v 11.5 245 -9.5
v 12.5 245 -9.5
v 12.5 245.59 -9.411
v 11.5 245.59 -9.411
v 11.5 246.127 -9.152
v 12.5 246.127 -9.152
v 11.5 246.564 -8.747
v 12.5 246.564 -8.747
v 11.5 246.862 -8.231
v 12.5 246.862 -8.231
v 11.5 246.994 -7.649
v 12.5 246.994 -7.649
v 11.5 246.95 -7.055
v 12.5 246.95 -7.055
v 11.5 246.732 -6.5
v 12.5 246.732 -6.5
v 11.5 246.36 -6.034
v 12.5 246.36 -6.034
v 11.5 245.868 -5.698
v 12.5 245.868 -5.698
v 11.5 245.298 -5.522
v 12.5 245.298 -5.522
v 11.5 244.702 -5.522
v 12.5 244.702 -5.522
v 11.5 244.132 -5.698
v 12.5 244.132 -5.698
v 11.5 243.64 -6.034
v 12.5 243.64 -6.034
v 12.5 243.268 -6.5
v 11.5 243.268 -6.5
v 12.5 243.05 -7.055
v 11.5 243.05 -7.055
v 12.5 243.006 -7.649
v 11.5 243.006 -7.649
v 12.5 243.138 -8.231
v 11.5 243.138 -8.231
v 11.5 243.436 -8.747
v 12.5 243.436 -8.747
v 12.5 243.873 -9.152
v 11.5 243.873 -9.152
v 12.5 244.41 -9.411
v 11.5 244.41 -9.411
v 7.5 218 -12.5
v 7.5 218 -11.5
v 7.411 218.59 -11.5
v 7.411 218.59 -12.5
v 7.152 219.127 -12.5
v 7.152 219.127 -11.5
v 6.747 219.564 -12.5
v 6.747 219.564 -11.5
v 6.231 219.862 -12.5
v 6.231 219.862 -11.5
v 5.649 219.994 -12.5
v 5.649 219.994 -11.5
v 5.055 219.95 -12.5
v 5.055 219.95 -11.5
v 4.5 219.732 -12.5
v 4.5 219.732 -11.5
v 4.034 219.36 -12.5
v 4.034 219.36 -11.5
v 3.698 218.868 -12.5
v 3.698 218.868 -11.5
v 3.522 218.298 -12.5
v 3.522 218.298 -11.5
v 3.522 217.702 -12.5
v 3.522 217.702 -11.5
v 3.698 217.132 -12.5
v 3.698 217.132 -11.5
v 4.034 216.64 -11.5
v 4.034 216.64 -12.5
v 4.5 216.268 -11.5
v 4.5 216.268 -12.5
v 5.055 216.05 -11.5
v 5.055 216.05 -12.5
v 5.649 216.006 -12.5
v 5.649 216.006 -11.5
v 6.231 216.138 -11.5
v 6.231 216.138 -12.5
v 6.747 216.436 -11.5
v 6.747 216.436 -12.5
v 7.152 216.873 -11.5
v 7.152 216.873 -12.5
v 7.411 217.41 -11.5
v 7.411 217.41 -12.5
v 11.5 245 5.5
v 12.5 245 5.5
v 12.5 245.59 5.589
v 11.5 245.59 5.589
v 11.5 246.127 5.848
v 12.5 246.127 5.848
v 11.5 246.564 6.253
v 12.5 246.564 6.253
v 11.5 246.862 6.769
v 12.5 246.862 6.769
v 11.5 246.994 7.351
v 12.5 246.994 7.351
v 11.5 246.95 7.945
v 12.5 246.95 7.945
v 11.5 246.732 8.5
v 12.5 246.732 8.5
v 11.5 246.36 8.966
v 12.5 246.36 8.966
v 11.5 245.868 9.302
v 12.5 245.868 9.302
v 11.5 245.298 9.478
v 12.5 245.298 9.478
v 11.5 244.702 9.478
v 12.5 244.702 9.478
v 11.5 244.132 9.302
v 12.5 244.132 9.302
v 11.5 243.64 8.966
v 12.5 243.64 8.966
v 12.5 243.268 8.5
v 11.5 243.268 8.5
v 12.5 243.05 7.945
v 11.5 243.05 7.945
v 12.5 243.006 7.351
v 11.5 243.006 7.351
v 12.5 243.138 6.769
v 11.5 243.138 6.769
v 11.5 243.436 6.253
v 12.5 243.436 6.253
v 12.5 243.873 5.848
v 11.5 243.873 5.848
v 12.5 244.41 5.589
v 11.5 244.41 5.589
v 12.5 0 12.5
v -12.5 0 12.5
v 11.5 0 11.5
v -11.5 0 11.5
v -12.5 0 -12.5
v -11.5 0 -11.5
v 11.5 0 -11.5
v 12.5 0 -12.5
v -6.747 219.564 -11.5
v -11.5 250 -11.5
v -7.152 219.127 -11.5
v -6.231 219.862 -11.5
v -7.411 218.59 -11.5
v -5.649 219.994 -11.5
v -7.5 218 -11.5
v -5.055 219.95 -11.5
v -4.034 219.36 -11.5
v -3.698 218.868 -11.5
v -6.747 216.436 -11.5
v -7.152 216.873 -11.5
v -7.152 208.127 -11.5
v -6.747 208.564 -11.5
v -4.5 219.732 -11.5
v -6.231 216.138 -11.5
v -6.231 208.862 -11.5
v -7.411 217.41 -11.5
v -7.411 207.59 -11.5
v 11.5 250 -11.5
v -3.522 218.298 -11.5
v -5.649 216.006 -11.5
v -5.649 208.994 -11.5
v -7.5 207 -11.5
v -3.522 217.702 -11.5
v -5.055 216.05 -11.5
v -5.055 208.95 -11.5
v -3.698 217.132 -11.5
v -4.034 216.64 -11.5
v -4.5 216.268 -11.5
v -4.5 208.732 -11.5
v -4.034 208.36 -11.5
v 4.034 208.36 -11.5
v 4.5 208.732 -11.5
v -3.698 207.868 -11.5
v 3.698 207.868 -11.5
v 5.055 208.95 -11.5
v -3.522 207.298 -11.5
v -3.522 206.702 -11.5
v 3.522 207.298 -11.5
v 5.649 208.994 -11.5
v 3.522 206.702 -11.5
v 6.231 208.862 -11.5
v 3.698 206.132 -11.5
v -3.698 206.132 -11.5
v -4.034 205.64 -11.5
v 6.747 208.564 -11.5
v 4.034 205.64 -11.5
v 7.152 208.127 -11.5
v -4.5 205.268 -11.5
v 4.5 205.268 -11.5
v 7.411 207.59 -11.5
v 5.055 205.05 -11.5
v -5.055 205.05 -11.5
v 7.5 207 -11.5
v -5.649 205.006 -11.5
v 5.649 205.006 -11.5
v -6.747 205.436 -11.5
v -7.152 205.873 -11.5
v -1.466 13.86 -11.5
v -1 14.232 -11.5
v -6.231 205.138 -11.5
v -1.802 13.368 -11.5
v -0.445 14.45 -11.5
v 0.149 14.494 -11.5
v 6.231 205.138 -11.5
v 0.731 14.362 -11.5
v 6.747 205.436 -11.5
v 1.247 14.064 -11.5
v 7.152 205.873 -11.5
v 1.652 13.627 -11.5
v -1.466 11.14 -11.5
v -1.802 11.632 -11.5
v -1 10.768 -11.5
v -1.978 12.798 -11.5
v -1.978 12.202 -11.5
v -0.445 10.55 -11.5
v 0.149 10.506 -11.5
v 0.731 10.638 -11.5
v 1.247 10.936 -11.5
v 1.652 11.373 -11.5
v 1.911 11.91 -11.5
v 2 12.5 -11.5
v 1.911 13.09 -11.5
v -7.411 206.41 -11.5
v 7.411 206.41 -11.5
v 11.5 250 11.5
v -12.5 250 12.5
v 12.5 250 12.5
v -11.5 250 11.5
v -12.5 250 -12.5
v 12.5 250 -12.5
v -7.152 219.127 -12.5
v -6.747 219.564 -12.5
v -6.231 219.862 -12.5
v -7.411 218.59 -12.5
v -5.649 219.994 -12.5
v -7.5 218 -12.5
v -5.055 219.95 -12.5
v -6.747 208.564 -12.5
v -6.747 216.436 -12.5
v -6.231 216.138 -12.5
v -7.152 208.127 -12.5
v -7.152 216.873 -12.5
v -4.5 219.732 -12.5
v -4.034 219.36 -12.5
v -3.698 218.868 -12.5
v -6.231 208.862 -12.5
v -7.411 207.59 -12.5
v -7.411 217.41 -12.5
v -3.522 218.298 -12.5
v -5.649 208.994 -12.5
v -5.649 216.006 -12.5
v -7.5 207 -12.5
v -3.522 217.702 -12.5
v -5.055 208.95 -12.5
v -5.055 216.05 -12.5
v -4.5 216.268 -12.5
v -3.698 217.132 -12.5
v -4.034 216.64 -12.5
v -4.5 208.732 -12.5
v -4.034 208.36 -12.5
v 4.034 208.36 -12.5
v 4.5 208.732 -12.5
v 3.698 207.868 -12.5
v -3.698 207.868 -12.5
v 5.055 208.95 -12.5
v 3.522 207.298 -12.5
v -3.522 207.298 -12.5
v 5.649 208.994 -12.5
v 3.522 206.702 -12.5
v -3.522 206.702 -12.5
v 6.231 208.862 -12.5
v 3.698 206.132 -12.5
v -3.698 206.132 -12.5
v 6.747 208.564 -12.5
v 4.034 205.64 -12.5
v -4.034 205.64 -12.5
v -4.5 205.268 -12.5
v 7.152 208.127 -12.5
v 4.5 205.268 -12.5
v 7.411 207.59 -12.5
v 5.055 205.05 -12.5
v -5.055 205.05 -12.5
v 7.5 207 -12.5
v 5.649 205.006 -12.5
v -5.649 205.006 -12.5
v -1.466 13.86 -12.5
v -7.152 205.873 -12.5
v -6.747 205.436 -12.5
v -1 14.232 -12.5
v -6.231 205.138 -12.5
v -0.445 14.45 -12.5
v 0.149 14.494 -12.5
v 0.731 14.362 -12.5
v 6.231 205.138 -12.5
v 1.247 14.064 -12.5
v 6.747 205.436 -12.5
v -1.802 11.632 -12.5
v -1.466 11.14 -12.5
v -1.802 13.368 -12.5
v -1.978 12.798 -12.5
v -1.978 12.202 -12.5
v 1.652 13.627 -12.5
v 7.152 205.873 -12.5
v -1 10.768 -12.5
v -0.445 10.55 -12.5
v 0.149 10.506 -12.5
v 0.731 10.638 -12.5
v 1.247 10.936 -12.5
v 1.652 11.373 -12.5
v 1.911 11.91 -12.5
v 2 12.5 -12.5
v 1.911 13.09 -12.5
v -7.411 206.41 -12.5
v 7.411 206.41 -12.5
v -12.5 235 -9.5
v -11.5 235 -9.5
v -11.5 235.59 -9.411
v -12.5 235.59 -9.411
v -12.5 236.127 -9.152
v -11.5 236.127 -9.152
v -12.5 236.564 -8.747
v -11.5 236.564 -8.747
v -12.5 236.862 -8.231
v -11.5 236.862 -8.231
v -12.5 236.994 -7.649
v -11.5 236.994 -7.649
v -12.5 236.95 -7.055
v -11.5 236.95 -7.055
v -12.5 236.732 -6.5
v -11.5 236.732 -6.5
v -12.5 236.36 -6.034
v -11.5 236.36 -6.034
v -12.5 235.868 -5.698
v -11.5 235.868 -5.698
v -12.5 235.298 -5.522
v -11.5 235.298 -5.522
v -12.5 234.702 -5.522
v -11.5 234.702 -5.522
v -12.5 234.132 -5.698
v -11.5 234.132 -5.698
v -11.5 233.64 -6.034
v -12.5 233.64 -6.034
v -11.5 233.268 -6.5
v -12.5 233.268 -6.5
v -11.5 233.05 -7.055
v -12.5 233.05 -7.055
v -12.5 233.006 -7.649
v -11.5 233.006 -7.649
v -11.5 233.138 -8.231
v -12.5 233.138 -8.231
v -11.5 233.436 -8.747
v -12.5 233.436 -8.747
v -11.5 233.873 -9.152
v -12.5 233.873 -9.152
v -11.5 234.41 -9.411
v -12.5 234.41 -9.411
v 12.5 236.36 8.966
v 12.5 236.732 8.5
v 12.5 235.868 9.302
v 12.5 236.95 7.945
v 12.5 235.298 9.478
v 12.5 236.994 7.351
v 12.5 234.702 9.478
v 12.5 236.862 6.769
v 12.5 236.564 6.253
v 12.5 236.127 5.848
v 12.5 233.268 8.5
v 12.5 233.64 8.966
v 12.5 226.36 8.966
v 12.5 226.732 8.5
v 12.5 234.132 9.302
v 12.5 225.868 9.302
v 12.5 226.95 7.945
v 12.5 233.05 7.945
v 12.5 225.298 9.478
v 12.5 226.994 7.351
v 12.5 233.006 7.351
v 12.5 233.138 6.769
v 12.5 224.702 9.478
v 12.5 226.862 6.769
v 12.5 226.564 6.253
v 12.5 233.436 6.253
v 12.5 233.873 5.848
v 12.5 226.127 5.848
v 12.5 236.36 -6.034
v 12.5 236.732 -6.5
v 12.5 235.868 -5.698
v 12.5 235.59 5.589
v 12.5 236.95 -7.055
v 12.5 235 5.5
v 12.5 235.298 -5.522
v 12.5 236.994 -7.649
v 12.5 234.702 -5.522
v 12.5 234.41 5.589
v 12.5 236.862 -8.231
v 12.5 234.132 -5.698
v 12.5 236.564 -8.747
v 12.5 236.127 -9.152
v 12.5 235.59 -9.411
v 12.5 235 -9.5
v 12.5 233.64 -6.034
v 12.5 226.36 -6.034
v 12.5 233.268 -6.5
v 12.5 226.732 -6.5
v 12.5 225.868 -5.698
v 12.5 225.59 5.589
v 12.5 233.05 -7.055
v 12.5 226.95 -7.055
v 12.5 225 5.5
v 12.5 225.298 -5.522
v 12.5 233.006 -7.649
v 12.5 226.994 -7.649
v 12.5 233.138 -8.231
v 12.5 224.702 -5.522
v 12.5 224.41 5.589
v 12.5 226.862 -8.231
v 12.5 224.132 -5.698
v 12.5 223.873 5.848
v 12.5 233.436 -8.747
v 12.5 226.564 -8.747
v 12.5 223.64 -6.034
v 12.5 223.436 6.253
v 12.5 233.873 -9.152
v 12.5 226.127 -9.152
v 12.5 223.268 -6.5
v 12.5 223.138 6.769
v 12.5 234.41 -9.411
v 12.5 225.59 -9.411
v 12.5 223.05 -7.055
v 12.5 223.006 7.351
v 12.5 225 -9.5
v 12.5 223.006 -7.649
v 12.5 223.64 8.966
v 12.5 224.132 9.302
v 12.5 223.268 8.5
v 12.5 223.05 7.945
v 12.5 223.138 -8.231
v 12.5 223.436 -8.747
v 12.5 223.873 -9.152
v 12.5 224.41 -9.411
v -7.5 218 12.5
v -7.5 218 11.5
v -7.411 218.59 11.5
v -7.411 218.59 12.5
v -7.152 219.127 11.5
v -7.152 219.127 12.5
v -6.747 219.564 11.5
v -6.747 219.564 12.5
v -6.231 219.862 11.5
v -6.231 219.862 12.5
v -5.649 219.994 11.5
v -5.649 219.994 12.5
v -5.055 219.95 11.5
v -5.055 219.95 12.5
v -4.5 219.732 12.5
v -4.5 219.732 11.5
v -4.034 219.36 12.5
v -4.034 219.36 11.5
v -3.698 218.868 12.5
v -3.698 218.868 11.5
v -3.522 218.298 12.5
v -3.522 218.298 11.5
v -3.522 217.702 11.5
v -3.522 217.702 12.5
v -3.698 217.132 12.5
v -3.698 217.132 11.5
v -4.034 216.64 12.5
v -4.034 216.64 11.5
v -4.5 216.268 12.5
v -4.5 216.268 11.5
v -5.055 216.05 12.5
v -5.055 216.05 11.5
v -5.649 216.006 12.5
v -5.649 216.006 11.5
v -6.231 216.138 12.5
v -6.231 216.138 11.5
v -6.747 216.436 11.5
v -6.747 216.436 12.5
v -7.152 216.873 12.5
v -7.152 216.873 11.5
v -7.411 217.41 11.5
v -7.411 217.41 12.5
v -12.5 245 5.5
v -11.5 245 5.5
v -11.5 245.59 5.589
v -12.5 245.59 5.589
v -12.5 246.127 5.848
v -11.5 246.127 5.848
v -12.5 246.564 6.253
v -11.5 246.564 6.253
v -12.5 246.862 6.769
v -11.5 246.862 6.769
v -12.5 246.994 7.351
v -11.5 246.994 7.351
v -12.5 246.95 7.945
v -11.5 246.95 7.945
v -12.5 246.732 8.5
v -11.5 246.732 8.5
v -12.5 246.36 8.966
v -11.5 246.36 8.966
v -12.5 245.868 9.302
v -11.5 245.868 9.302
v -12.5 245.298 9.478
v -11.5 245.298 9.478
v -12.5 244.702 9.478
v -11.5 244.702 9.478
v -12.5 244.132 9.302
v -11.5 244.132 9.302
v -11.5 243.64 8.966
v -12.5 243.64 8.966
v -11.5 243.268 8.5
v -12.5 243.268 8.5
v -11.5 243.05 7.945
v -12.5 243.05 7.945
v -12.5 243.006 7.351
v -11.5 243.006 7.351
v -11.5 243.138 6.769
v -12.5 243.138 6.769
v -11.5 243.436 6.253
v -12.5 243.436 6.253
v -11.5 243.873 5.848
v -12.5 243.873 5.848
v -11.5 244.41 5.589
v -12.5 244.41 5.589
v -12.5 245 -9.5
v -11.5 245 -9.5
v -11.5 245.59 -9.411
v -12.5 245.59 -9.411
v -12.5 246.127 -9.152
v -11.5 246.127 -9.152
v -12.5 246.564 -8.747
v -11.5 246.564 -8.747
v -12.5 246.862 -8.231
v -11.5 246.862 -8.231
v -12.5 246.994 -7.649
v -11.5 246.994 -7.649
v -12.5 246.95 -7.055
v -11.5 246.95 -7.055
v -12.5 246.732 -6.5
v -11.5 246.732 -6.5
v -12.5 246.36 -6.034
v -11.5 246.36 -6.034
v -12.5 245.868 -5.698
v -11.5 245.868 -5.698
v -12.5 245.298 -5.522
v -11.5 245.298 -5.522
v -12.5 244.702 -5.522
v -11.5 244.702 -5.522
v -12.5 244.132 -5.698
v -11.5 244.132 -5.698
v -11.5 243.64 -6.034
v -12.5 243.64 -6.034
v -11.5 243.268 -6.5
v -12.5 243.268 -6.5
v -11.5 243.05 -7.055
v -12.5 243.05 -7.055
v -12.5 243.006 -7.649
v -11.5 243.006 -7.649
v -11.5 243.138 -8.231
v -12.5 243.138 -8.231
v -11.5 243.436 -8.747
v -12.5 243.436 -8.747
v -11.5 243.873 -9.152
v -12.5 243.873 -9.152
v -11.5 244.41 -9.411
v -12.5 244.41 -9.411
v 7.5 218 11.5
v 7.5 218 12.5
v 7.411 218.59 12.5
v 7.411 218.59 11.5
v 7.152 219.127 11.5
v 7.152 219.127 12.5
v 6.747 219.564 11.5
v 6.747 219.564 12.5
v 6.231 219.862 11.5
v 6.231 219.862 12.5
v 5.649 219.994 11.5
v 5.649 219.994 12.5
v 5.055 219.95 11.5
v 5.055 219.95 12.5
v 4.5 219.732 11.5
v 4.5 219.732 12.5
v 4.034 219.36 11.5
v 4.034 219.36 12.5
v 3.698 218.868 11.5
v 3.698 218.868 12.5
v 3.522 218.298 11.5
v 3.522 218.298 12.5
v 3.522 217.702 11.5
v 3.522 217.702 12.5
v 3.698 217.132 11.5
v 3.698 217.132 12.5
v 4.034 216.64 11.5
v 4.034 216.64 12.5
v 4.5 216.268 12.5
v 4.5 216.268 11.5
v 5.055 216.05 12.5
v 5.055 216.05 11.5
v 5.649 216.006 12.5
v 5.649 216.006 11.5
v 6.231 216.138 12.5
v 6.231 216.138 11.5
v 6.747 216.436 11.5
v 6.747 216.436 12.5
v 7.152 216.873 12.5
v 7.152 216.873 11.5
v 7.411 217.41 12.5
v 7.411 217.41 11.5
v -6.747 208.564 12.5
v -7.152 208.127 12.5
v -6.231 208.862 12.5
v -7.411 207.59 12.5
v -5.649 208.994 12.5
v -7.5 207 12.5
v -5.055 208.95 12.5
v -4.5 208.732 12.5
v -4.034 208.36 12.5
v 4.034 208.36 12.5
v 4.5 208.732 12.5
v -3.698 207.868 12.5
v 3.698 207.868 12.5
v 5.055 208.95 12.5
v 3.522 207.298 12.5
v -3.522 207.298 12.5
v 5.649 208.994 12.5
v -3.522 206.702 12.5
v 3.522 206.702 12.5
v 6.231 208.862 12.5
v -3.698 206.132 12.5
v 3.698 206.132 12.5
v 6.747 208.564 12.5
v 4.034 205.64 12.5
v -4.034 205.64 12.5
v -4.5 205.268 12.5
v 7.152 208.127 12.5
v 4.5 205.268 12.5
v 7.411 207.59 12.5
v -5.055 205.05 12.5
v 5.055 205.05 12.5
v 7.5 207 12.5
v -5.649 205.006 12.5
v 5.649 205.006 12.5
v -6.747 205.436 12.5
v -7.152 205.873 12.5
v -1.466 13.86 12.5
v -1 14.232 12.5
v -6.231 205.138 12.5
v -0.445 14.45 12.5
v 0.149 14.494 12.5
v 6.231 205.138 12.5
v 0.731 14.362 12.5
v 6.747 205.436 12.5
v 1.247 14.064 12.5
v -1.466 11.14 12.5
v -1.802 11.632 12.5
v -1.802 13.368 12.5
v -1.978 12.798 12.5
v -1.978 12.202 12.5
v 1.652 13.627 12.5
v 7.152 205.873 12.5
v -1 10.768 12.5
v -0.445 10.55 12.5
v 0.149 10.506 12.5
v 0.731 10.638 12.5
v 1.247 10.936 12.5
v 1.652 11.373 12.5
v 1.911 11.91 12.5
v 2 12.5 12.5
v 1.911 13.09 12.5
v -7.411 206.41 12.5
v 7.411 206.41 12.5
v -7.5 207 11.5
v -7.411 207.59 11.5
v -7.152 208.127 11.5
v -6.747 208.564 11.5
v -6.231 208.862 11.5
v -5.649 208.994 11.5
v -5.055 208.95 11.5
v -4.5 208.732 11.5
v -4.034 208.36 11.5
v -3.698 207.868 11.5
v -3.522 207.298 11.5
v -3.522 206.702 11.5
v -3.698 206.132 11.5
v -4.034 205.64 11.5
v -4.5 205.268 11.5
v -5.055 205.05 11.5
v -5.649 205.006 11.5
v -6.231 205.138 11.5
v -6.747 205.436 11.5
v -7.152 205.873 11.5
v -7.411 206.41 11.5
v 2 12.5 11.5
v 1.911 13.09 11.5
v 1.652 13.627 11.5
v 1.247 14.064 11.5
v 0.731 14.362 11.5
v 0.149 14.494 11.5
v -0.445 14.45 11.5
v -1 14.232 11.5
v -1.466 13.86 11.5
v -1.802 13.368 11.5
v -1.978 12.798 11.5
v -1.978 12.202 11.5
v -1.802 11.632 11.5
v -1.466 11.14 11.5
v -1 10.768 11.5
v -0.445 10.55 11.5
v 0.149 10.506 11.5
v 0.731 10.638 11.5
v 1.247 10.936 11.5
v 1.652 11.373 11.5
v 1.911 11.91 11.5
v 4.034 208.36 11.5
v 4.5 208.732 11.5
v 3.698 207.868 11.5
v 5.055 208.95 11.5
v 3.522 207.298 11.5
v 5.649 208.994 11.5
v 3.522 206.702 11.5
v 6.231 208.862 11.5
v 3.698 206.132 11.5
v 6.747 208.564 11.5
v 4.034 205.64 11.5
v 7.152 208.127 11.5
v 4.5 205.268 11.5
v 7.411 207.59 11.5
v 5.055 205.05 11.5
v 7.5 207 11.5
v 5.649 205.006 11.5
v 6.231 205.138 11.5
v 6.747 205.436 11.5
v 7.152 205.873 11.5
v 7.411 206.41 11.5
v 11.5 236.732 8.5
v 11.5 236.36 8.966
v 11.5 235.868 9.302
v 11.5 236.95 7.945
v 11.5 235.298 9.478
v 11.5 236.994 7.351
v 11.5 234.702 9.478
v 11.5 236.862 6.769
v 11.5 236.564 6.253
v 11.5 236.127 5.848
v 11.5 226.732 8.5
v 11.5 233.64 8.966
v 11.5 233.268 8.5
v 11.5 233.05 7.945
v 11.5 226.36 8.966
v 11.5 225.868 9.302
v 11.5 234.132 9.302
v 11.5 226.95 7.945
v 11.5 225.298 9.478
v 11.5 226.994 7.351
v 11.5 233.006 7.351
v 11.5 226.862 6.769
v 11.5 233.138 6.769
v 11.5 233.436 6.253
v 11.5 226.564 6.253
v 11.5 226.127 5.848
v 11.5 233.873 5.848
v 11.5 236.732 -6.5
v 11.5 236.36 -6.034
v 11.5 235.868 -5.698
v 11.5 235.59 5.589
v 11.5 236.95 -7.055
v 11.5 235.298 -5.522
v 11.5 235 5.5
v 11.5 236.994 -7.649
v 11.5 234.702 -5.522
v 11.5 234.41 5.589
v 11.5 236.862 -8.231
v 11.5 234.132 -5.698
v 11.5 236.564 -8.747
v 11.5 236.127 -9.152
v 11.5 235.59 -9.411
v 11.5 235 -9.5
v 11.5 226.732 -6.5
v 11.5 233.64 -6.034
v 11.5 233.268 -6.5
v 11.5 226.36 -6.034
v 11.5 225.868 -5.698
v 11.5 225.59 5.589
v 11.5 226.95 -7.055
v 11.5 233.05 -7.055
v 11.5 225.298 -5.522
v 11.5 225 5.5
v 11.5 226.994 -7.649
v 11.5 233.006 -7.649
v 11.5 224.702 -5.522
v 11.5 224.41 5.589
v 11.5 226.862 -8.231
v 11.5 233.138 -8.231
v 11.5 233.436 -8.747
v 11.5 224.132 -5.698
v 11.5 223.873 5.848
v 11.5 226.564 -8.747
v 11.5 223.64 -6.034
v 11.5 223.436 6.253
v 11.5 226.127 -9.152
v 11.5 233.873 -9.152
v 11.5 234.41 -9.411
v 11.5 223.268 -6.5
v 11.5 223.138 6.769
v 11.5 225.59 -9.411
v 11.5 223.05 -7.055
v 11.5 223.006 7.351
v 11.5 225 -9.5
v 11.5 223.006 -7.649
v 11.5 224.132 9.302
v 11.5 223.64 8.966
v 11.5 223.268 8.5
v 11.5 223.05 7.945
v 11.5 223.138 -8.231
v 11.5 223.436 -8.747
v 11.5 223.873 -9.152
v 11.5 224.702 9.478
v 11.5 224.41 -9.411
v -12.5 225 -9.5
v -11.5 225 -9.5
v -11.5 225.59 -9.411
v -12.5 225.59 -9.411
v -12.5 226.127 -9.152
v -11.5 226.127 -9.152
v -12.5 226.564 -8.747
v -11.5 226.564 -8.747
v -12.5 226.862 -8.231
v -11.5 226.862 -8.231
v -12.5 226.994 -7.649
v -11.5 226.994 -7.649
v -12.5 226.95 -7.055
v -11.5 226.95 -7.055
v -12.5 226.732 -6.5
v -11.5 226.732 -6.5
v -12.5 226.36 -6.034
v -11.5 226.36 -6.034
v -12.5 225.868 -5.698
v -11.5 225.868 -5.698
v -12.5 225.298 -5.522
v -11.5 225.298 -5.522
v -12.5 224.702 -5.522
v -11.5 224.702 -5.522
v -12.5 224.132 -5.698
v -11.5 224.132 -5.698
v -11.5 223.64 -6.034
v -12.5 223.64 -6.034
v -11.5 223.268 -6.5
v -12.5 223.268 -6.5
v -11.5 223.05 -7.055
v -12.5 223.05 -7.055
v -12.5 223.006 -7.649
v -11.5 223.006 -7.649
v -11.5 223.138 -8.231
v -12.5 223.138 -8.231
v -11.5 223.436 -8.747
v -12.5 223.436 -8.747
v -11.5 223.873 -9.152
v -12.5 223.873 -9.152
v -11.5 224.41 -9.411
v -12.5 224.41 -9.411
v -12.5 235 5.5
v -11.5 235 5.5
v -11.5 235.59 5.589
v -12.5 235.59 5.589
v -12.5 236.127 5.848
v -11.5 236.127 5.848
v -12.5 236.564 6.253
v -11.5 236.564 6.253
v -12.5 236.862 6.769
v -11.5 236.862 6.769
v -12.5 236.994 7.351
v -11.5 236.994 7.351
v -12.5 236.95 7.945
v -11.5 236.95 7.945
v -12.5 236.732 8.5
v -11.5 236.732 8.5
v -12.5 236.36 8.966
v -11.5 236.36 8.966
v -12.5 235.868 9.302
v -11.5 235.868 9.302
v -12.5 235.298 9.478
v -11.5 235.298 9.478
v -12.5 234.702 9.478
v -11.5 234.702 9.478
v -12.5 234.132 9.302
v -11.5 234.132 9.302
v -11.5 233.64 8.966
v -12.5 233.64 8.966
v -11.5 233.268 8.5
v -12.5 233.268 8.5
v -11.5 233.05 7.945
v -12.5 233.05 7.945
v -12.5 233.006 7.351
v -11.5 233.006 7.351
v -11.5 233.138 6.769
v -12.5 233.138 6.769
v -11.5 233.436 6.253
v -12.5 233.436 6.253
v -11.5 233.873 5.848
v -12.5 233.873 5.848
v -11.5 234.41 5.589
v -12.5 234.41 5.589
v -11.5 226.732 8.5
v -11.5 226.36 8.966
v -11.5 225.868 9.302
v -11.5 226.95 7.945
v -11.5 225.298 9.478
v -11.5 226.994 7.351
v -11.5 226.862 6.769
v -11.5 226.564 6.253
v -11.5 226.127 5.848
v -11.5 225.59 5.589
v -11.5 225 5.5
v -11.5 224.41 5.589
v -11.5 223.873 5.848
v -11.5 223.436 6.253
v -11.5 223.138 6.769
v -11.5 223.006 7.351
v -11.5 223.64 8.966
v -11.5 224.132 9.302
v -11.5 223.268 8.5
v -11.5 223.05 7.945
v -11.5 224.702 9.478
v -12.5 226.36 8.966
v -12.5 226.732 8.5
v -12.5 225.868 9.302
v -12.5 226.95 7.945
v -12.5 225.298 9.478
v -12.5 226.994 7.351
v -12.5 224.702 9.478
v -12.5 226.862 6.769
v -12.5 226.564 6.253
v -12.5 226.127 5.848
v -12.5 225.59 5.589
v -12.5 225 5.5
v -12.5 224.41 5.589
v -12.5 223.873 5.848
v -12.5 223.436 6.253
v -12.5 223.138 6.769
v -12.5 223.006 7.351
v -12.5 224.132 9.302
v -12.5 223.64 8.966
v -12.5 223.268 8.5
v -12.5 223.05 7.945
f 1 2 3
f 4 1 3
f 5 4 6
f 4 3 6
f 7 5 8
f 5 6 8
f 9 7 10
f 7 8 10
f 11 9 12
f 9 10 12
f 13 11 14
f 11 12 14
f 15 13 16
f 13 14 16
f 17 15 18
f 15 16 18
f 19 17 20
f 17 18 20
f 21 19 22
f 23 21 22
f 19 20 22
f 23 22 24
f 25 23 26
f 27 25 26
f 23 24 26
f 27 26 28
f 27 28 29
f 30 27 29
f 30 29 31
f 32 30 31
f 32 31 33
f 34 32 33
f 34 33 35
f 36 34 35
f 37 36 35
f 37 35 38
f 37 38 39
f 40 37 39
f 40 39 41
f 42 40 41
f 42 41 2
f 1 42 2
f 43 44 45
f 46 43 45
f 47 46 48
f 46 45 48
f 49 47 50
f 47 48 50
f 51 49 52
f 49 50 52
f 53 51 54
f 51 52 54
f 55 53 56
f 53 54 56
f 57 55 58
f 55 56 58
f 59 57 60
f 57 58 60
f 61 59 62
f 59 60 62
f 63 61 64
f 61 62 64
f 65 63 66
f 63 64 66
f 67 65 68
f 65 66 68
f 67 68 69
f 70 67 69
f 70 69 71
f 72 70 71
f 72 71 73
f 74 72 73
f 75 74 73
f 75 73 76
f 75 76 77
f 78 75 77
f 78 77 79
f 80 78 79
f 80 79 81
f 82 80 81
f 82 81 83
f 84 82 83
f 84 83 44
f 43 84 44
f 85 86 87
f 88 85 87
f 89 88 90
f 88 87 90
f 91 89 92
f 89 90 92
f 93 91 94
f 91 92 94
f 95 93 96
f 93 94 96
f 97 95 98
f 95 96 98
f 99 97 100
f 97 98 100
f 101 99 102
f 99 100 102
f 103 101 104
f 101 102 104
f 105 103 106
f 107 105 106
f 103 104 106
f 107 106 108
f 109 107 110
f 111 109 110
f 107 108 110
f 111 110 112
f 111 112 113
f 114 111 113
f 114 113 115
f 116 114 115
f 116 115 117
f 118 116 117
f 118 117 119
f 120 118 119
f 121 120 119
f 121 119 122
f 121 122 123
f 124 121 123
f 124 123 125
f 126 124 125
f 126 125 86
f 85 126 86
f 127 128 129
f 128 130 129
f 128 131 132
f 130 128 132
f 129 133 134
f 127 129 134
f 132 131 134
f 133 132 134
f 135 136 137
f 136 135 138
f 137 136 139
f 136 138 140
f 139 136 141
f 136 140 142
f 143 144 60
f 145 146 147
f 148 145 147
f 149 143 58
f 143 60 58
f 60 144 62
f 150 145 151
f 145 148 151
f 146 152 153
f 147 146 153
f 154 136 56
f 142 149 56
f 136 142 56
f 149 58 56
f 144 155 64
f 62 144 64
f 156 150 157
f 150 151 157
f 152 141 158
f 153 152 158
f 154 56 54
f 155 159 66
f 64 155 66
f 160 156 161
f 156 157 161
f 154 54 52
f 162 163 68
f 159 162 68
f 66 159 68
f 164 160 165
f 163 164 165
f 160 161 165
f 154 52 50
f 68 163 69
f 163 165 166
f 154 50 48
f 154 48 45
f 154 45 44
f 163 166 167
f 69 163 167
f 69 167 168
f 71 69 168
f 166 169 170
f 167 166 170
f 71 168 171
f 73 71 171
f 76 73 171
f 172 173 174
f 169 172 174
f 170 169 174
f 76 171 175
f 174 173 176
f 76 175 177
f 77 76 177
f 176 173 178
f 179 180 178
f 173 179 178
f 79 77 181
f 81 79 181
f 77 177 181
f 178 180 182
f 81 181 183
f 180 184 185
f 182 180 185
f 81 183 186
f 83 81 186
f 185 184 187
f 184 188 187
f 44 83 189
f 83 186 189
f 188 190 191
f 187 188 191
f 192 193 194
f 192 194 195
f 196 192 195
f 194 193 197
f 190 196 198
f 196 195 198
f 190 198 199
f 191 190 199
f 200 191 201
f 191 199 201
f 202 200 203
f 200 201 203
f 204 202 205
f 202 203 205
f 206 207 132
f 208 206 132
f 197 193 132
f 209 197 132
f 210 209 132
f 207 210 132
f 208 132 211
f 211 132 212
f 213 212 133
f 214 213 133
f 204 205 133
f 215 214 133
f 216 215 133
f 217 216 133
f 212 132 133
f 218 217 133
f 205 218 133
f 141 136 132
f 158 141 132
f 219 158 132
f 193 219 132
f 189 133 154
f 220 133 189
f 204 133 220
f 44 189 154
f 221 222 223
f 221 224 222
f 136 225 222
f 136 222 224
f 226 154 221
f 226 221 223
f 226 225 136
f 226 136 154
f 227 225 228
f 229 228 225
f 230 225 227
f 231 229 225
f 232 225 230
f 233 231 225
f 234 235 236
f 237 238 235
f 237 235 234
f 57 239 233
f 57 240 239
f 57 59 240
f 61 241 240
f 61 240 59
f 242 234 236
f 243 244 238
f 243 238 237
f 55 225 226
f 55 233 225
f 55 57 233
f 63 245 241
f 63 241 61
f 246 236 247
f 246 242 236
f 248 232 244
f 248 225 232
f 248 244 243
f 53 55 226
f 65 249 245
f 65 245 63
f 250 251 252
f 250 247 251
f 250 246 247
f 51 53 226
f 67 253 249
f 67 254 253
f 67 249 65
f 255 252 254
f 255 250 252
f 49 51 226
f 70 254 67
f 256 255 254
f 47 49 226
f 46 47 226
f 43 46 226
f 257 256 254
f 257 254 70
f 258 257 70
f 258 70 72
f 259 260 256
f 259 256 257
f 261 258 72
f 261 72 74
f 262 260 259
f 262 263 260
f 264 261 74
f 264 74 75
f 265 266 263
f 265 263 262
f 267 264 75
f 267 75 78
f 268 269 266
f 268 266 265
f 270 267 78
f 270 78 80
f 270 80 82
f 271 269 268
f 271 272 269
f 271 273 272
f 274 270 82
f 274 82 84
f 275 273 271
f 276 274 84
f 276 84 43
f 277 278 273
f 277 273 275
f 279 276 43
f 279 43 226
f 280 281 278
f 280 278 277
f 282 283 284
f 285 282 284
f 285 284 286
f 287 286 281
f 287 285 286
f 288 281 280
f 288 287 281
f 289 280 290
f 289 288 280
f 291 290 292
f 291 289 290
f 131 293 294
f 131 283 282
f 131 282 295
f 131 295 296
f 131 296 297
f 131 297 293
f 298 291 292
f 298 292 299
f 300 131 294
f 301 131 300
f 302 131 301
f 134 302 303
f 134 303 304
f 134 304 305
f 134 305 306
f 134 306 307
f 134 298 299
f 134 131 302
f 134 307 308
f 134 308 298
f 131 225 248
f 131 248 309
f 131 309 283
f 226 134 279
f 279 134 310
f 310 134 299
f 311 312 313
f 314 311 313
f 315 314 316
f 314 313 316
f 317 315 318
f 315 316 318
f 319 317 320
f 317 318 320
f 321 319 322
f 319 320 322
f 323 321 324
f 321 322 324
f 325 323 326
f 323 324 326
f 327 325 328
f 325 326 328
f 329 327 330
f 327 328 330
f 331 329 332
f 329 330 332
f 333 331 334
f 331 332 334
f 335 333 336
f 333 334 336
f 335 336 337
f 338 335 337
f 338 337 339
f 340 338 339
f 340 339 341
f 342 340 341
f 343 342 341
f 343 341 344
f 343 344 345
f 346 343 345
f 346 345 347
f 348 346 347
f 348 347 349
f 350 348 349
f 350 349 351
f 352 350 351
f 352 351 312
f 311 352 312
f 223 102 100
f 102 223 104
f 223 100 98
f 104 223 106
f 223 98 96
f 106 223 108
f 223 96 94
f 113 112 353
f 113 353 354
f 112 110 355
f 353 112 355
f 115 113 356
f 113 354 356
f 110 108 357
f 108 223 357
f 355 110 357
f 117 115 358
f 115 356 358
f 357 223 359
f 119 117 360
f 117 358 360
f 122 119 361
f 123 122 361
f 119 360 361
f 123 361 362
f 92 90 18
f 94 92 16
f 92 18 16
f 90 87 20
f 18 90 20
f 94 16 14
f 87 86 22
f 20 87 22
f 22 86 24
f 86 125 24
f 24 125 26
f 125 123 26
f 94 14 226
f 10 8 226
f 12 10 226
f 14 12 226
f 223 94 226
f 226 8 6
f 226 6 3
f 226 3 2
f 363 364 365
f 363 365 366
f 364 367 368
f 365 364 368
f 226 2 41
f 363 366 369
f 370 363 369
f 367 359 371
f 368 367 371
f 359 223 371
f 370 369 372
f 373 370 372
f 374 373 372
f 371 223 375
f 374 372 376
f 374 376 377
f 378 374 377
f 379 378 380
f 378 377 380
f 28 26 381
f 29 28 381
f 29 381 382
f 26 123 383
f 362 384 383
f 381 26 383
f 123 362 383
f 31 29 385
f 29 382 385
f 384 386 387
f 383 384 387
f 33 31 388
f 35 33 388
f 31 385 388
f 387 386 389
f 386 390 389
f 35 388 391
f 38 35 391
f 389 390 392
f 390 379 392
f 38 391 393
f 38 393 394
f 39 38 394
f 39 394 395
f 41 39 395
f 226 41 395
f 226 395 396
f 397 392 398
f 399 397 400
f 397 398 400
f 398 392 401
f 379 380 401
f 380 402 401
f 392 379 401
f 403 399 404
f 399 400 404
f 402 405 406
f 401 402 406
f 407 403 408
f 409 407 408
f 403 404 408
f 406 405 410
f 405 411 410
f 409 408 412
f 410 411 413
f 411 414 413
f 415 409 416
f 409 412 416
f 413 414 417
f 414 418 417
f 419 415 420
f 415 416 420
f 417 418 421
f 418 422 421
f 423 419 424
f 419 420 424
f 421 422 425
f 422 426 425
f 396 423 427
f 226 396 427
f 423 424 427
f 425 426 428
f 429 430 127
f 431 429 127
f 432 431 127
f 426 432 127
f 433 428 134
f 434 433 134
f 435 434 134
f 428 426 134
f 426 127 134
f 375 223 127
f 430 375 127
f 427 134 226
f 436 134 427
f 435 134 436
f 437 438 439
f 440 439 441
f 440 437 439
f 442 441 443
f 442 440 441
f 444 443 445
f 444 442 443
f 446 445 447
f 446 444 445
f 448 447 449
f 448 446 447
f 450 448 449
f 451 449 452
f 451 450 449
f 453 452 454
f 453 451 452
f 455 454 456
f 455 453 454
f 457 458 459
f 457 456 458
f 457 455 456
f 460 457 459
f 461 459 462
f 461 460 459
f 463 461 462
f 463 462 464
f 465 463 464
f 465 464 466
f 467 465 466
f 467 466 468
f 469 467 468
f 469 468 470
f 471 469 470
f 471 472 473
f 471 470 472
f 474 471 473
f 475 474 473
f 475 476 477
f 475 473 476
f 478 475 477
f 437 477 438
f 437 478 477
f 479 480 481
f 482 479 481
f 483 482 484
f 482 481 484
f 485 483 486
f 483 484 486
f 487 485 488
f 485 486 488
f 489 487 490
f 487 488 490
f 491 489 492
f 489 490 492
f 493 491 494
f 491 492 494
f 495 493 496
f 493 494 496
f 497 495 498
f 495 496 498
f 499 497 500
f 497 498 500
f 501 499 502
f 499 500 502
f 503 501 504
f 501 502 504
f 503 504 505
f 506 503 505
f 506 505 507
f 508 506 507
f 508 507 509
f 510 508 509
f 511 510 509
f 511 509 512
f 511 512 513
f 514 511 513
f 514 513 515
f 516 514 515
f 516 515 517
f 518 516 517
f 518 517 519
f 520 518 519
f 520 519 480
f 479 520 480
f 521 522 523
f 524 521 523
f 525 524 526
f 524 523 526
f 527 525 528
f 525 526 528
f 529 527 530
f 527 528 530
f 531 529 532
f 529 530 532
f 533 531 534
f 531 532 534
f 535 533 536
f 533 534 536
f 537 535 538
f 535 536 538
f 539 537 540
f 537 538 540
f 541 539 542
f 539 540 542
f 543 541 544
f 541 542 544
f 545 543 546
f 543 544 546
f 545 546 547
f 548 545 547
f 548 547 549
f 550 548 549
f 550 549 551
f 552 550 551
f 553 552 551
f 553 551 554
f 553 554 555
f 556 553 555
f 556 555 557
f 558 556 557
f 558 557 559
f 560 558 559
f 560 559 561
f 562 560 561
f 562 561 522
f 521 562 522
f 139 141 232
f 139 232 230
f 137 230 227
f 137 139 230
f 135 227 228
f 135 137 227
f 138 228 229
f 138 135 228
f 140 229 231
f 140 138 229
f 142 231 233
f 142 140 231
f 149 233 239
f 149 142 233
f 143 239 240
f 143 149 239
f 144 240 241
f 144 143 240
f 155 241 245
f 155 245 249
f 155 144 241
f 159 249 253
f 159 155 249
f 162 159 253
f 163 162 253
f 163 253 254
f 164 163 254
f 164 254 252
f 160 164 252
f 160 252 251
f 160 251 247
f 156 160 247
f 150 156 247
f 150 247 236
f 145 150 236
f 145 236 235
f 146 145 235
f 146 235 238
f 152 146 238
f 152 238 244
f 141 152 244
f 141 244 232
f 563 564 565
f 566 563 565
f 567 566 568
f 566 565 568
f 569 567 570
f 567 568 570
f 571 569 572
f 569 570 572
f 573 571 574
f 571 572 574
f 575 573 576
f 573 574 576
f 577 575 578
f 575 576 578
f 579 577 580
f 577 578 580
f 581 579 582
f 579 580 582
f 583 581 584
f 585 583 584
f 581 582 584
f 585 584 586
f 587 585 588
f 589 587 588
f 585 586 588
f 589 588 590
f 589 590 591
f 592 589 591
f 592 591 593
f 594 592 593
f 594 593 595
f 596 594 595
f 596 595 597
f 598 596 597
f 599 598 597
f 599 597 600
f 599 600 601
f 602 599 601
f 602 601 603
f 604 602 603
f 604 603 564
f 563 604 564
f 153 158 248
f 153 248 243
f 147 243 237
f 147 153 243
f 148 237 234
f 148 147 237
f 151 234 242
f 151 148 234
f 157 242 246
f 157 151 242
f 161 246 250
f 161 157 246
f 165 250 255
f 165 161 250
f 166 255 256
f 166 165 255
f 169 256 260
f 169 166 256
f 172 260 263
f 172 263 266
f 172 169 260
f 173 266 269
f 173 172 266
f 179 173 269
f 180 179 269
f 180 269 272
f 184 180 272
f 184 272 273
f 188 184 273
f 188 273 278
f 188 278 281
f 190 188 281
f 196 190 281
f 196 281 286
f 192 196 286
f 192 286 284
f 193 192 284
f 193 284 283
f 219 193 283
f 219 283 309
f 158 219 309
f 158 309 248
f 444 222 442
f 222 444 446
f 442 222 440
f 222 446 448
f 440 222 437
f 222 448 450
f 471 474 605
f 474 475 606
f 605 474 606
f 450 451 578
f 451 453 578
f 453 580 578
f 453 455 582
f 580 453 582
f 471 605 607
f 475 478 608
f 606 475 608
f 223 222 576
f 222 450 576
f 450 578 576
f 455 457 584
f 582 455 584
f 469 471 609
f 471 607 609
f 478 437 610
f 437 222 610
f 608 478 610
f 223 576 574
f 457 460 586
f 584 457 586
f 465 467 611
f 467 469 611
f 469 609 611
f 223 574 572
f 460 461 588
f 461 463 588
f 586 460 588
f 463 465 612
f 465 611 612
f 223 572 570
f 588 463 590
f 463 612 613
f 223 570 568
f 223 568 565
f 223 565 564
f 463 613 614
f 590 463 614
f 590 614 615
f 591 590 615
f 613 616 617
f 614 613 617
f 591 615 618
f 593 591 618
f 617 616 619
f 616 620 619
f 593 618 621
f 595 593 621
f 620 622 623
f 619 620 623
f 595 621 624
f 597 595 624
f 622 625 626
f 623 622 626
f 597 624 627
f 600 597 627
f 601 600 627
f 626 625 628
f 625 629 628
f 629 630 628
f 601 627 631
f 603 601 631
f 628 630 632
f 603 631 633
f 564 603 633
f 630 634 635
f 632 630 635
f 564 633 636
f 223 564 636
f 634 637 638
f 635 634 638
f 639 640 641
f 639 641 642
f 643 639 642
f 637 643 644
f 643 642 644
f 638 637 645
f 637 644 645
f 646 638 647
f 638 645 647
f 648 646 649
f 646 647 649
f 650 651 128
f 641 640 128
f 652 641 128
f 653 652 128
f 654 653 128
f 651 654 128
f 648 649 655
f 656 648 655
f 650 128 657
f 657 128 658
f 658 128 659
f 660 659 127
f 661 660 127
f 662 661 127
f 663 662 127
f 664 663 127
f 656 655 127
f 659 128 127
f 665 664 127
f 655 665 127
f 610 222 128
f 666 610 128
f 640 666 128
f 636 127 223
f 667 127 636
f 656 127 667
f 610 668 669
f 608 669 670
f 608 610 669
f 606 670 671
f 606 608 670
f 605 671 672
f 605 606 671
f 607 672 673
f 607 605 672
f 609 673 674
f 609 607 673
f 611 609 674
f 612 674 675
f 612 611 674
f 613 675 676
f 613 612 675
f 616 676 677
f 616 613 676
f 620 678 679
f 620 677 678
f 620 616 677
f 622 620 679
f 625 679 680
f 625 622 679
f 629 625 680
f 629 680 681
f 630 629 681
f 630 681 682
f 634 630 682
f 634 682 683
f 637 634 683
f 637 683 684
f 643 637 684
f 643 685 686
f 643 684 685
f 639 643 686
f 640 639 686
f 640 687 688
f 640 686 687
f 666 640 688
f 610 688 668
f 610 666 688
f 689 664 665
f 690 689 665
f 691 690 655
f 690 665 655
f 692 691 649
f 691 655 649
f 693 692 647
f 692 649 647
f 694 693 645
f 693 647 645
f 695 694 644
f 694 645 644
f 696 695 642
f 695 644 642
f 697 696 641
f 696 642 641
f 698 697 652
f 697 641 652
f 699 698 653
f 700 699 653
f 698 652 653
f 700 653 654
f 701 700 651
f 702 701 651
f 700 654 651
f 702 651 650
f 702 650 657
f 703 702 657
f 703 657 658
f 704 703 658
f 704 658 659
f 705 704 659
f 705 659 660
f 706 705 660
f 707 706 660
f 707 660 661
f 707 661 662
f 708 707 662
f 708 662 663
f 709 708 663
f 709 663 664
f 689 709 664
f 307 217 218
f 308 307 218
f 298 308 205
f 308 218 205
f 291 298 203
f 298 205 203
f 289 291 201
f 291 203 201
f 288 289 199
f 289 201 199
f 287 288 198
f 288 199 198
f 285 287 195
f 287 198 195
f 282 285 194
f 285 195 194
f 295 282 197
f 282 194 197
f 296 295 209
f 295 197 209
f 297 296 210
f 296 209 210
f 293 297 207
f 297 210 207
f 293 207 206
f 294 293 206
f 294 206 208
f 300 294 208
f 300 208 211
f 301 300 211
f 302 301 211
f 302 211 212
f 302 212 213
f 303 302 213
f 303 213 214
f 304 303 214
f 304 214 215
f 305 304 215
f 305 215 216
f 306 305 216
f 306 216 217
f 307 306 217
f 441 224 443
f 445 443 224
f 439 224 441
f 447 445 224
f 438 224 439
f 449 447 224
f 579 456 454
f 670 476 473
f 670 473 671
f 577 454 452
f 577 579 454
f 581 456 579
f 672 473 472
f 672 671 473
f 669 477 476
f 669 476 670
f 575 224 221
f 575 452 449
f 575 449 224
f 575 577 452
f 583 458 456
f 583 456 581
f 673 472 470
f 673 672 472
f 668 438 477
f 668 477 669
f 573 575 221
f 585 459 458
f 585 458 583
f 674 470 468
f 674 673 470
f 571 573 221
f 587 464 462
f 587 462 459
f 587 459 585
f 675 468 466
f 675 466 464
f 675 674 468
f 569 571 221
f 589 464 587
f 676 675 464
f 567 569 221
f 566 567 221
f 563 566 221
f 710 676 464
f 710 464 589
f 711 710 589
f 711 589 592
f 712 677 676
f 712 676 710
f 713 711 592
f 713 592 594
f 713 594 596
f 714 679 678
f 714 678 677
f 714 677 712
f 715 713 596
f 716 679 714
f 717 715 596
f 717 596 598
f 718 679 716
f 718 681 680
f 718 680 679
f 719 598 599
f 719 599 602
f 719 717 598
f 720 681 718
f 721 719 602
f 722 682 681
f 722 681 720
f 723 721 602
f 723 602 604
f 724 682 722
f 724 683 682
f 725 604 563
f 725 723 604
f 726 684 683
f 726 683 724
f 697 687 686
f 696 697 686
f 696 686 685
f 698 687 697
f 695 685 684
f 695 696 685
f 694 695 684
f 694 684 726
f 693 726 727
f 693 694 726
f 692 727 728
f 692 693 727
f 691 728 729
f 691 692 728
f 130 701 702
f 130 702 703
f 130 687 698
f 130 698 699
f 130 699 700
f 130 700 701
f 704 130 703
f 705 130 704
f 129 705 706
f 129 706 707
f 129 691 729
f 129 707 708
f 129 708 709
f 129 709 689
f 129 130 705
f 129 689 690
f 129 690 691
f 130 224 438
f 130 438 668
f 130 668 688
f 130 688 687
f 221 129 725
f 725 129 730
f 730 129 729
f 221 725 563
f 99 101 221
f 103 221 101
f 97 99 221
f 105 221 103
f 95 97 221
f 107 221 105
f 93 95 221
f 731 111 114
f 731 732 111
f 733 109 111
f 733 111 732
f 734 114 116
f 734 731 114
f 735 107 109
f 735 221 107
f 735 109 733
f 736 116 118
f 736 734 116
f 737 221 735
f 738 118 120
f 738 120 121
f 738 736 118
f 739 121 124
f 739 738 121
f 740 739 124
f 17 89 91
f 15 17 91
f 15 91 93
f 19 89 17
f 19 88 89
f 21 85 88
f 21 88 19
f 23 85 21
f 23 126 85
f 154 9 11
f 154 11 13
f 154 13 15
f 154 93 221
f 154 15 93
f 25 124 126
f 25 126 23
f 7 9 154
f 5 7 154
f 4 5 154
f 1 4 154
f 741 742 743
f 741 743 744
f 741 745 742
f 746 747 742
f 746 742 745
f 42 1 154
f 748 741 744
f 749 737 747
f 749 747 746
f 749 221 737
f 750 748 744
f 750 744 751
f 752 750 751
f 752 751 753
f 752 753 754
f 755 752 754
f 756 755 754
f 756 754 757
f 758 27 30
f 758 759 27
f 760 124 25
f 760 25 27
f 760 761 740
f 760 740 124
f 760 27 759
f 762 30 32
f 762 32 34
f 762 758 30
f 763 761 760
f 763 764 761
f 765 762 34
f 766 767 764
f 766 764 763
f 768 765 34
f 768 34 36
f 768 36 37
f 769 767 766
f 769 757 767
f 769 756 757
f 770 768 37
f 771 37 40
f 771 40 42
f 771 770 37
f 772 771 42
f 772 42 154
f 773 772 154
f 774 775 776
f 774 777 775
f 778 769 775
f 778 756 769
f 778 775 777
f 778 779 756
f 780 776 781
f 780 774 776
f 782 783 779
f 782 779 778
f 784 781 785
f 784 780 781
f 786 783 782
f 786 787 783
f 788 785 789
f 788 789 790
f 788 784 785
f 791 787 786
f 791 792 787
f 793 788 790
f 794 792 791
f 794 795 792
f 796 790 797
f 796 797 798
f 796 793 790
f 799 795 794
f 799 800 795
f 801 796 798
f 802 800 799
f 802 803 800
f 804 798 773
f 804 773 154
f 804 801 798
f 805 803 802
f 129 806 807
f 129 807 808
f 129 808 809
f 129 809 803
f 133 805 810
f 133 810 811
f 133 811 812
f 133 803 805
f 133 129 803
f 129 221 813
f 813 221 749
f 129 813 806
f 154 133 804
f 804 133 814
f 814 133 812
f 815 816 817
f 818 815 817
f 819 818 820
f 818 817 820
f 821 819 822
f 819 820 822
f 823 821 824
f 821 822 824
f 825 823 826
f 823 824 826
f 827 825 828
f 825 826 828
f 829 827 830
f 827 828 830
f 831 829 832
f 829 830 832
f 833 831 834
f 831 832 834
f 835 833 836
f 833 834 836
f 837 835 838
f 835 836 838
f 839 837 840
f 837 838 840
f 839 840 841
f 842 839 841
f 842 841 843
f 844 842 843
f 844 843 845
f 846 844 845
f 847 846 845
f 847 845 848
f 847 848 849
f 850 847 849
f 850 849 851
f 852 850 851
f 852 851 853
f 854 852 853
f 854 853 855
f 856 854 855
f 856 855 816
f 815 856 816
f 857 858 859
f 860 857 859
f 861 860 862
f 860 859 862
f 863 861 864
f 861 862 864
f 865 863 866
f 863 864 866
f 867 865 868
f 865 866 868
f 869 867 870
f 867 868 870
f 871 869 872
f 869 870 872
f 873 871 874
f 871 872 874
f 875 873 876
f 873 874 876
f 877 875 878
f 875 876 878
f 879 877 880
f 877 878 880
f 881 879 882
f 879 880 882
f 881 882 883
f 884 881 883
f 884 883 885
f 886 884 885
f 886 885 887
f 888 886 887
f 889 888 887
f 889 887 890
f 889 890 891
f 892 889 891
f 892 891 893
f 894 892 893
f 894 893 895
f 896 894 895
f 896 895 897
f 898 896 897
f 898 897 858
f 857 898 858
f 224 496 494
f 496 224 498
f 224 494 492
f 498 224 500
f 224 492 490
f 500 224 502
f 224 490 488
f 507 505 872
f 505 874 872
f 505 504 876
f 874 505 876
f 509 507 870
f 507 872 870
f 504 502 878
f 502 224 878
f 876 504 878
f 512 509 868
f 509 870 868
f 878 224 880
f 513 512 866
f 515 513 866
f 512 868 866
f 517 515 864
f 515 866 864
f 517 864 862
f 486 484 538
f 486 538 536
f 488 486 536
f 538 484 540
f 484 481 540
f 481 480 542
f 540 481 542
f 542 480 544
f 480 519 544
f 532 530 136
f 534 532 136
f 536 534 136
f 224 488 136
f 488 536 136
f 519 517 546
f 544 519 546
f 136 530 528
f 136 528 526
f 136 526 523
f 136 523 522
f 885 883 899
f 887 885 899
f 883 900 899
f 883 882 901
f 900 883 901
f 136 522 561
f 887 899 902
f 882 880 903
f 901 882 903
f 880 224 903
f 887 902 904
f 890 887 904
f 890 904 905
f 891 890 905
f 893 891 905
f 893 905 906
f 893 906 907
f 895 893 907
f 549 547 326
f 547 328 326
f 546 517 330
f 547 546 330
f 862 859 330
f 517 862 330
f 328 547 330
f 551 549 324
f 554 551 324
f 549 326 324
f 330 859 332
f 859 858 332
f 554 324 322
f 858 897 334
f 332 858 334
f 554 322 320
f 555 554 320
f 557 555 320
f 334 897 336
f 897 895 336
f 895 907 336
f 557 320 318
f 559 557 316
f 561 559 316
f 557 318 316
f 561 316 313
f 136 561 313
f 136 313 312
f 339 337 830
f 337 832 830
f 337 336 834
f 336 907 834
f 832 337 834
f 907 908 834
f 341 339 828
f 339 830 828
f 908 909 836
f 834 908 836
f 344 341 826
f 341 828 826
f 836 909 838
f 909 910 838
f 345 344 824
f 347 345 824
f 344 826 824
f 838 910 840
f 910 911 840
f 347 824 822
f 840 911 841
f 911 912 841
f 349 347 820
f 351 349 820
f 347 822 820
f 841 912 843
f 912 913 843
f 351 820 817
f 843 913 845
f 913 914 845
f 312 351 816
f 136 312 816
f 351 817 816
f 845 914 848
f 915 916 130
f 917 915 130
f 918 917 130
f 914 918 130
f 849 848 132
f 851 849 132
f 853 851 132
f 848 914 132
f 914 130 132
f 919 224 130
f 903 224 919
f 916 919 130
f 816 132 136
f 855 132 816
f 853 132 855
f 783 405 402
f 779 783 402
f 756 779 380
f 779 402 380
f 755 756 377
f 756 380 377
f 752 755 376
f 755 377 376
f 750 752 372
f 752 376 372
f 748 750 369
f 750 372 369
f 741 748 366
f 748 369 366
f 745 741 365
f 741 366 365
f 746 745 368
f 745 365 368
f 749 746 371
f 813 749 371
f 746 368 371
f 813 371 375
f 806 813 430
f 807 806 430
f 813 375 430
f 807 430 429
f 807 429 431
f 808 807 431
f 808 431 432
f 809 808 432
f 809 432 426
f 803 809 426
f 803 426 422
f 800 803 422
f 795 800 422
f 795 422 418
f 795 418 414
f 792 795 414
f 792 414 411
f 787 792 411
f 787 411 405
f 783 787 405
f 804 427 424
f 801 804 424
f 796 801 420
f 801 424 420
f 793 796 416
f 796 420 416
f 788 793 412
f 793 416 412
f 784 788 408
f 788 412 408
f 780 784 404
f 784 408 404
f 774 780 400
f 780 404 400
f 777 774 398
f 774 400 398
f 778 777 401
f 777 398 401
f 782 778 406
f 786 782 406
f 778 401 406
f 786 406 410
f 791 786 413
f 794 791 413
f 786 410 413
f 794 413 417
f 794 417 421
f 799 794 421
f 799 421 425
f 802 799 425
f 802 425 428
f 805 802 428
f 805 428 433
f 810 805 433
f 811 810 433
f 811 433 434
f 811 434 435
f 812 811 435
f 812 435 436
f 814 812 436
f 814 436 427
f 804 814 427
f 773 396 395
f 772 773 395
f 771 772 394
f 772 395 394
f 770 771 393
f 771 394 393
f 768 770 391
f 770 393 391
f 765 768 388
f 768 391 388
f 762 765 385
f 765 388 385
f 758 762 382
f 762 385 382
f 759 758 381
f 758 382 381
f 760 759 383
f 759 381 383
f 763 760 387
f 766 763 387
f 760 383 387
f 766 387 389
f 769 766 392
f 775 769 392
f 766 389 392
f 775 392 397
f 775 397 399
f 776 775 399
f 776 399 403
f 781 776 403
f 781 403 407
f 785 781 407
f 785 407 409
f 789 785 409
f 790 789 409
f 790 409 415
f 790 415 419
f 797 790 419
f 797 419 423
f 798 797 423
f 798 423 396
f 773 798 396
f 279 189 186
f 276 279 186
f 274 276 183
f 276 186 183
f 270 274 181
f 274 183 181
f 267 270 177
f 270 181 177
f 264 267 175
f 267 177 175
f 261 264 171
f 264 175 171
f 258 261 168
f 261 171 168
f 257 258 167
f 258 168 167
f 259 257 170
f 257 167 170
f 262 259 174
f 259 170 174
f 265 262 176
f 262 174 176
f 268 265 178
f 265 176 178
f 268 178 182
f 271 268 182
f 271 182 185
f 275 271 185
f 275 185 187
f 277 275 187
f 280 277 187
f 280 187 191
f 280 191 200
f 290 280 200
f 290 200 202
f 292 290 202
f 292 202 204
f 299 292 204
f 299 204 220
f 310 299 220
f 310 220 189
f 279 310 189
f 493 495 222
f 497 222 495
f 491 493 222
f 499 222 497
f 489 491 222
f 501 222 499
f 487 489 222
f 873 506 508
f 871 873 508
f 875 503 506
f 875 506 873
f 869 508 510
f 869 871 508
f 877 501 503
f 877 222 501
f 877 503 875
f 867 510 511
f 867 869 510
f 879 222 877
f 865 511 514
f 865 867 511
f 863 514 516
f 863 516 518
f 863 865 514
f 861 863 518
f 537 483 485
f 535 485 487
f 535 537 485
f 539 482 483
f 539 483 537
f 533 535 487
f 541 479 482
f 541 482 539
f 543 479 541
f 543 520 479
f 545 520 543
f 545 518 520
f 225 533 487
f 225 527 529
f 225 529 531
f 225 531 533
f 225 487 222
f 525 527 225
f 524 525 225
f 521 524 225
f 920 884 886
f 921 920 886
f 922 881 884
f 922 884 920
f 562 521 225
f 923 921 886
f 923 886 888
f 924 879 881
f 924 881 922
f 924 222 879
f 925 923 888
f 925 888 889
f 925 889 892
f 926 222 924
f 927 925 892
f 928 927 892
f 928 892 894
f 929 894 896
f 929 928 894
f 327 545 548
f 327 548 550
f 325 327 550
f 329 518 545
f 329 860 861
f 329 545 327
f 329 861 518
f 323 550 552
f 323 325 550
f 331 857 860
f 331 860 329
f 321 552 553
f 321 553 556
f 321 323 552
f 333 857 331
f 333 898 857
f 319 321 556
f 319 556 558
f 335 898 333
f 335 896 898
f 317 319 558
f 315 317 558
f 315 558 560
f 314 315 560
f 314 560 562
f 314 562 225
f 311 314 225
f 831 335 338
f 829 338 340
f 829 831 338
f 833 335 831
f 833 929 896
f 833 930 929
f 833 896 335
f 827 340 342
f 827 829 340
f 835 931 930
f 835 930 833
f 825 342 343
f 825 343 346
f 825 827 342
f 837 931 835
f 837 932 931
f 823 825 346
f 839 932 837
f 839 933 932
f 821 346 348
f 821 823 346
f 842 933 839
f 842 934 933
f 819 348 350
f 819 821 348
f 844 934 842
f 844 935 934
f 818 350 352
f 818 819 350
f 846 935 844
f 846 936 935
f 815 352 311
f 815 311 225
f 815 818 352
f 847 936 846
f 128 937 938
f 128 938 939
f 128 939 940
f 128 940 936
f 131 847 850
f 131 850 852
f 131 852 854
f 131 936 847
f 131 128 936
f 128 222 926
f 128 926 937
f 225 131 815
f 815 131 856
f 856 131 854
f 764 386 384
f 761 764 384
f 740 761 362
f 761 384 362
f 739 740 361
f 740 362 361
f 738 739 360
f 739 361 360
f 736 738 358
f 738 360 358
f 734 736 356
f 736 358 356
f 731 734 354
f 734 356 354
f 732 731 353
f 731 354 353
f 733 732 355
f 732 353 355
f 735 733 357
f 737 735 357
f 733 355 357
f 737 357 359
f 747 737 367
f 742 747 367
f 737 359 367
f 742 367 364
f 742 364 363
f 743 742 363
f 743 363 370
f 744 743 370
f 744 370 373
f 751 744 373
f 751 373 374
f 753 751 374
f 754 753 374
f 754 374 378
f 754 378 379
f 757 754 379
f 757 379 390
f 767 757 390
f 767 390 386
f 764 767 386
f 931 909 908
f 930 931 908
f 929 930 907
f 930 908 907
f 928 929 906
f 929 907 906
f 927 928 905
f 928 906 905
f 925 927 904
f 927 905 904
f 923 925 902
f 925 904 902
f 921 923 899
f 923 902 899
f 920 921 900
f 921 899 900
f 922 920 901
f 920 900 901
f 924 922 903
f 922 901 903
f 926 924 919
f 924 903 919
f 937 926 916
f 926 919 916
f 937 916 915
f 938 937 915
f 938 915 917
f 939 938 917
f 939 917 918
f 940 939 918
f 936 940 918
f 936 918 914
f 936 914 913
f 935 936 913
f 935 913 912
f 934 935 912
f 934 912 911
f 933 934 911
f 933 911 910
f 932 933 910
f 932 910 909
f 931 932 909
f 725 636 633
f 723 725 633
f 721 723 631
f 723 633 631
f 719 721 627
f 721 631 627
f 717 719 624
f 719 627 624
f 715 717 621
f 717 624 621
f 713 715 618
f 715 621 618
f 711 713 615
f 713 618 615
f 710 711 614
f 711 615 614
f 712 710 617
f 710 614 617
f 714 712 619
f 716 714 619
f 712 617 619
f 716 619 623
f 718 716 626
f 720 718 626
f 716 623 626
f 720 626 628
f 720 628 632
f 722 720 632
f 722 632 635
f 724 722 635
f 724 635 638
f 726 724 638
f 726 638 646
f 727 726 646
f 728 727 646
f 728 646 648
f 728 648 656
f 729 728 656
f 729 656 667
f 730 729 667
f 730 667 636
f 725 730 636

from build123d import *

# Parameters (mm, degrees)
SKETCH1_W           = 25
SKETCH1_H           = 25
SKETCH1_W_2         = 23
SKETCH1_H_2         = 23
BOSS_EXTRUDE1_DEPTH = 250
SKETCH3_R           = 2
CUT_EXTRUDE1_DEPTH  = 25
SKETCH4_R           = 2
CUT_EXTRUDE2_DEPTH  = 25
SKETCH5_R           = 2
CUT_EXTRUDE3_DEPTH  = 25


with BuildPart() as part:
    # Sketch1 → Boss-Extrude1 (new body)
    with BuildSketch(Plane(origin=(0, 0, 0), x_dir=(1, 0, 0), z_dir=(0, 1, 0))):
        Rectangle(SKETCH1_W, SKETCH1_H)
        Rectangle(SKETCH1_W_2, SKETCH1_H_2, mode=Mode.SUBTRACT)
    extrude(amount=BOSS_EXTRUDE1_DEPTH)

    # Sketch3 → Cut-Extrude1 (cut)
    with BuildSketch(Plane(origin=(12.5, 0, 0), x_dir=(0, 0, -1), z_dir=(1, 0, 0))):
        with Locations((7.5, 245)):
            Circle(SKETCH3_R)
        with Locations((7.5, 235)):
            Circle(SKETCH3_R)
        with Locations((-7.5, 245)):
            Circle(SKETCH3_R)
        with Locations((-7.5, 235)):
            Circle(SKETCH3_R)
        with Locations((7.5, 225)):
            Circle(SKETCH3_R)
        with Locations((-7.5, 225)):
            Circle(SKETCH3_R)
    extrude(amount=-CUT_EXTRUDE1_DEPTH, mode=Mode.SUBTRACT)

    # Sketch4 → Cut-Extrude2 (cut)
    with BuildSketch(Plane.XY.offset(12.5)):
        with Locations((5.5, 218)):
            Circle(SKETCH4_R)
        with Locations((5.5, 207)):
            Circle(SKETCH4_R)
    cut_extrude2 = extrude(amount=-CUT_EXTRUDE2_DEPTH, mode=Mode.SUBTRACT)

    # Sketch5 → Cut-Extrude3 (cut)
    with BuildSketch(Plane.XY.offset(12.5)):
        with Locations((0, 12.5)):
            Circle(SKETCH5_R)
    extrude(amount=-CUT_EXTRUDE3_DEPTH, mode=Mode.SUBTRACT)

    # Mirror1: Cut-Extrude2 across plane
    add(cut_extrude2.mirror(Plane(origin=(0, 0, 0), x_dir=(0, 0, 1), z_dir=(1, 0, 0))), mode=Mode.SUBTRACT)


solid = part.part
